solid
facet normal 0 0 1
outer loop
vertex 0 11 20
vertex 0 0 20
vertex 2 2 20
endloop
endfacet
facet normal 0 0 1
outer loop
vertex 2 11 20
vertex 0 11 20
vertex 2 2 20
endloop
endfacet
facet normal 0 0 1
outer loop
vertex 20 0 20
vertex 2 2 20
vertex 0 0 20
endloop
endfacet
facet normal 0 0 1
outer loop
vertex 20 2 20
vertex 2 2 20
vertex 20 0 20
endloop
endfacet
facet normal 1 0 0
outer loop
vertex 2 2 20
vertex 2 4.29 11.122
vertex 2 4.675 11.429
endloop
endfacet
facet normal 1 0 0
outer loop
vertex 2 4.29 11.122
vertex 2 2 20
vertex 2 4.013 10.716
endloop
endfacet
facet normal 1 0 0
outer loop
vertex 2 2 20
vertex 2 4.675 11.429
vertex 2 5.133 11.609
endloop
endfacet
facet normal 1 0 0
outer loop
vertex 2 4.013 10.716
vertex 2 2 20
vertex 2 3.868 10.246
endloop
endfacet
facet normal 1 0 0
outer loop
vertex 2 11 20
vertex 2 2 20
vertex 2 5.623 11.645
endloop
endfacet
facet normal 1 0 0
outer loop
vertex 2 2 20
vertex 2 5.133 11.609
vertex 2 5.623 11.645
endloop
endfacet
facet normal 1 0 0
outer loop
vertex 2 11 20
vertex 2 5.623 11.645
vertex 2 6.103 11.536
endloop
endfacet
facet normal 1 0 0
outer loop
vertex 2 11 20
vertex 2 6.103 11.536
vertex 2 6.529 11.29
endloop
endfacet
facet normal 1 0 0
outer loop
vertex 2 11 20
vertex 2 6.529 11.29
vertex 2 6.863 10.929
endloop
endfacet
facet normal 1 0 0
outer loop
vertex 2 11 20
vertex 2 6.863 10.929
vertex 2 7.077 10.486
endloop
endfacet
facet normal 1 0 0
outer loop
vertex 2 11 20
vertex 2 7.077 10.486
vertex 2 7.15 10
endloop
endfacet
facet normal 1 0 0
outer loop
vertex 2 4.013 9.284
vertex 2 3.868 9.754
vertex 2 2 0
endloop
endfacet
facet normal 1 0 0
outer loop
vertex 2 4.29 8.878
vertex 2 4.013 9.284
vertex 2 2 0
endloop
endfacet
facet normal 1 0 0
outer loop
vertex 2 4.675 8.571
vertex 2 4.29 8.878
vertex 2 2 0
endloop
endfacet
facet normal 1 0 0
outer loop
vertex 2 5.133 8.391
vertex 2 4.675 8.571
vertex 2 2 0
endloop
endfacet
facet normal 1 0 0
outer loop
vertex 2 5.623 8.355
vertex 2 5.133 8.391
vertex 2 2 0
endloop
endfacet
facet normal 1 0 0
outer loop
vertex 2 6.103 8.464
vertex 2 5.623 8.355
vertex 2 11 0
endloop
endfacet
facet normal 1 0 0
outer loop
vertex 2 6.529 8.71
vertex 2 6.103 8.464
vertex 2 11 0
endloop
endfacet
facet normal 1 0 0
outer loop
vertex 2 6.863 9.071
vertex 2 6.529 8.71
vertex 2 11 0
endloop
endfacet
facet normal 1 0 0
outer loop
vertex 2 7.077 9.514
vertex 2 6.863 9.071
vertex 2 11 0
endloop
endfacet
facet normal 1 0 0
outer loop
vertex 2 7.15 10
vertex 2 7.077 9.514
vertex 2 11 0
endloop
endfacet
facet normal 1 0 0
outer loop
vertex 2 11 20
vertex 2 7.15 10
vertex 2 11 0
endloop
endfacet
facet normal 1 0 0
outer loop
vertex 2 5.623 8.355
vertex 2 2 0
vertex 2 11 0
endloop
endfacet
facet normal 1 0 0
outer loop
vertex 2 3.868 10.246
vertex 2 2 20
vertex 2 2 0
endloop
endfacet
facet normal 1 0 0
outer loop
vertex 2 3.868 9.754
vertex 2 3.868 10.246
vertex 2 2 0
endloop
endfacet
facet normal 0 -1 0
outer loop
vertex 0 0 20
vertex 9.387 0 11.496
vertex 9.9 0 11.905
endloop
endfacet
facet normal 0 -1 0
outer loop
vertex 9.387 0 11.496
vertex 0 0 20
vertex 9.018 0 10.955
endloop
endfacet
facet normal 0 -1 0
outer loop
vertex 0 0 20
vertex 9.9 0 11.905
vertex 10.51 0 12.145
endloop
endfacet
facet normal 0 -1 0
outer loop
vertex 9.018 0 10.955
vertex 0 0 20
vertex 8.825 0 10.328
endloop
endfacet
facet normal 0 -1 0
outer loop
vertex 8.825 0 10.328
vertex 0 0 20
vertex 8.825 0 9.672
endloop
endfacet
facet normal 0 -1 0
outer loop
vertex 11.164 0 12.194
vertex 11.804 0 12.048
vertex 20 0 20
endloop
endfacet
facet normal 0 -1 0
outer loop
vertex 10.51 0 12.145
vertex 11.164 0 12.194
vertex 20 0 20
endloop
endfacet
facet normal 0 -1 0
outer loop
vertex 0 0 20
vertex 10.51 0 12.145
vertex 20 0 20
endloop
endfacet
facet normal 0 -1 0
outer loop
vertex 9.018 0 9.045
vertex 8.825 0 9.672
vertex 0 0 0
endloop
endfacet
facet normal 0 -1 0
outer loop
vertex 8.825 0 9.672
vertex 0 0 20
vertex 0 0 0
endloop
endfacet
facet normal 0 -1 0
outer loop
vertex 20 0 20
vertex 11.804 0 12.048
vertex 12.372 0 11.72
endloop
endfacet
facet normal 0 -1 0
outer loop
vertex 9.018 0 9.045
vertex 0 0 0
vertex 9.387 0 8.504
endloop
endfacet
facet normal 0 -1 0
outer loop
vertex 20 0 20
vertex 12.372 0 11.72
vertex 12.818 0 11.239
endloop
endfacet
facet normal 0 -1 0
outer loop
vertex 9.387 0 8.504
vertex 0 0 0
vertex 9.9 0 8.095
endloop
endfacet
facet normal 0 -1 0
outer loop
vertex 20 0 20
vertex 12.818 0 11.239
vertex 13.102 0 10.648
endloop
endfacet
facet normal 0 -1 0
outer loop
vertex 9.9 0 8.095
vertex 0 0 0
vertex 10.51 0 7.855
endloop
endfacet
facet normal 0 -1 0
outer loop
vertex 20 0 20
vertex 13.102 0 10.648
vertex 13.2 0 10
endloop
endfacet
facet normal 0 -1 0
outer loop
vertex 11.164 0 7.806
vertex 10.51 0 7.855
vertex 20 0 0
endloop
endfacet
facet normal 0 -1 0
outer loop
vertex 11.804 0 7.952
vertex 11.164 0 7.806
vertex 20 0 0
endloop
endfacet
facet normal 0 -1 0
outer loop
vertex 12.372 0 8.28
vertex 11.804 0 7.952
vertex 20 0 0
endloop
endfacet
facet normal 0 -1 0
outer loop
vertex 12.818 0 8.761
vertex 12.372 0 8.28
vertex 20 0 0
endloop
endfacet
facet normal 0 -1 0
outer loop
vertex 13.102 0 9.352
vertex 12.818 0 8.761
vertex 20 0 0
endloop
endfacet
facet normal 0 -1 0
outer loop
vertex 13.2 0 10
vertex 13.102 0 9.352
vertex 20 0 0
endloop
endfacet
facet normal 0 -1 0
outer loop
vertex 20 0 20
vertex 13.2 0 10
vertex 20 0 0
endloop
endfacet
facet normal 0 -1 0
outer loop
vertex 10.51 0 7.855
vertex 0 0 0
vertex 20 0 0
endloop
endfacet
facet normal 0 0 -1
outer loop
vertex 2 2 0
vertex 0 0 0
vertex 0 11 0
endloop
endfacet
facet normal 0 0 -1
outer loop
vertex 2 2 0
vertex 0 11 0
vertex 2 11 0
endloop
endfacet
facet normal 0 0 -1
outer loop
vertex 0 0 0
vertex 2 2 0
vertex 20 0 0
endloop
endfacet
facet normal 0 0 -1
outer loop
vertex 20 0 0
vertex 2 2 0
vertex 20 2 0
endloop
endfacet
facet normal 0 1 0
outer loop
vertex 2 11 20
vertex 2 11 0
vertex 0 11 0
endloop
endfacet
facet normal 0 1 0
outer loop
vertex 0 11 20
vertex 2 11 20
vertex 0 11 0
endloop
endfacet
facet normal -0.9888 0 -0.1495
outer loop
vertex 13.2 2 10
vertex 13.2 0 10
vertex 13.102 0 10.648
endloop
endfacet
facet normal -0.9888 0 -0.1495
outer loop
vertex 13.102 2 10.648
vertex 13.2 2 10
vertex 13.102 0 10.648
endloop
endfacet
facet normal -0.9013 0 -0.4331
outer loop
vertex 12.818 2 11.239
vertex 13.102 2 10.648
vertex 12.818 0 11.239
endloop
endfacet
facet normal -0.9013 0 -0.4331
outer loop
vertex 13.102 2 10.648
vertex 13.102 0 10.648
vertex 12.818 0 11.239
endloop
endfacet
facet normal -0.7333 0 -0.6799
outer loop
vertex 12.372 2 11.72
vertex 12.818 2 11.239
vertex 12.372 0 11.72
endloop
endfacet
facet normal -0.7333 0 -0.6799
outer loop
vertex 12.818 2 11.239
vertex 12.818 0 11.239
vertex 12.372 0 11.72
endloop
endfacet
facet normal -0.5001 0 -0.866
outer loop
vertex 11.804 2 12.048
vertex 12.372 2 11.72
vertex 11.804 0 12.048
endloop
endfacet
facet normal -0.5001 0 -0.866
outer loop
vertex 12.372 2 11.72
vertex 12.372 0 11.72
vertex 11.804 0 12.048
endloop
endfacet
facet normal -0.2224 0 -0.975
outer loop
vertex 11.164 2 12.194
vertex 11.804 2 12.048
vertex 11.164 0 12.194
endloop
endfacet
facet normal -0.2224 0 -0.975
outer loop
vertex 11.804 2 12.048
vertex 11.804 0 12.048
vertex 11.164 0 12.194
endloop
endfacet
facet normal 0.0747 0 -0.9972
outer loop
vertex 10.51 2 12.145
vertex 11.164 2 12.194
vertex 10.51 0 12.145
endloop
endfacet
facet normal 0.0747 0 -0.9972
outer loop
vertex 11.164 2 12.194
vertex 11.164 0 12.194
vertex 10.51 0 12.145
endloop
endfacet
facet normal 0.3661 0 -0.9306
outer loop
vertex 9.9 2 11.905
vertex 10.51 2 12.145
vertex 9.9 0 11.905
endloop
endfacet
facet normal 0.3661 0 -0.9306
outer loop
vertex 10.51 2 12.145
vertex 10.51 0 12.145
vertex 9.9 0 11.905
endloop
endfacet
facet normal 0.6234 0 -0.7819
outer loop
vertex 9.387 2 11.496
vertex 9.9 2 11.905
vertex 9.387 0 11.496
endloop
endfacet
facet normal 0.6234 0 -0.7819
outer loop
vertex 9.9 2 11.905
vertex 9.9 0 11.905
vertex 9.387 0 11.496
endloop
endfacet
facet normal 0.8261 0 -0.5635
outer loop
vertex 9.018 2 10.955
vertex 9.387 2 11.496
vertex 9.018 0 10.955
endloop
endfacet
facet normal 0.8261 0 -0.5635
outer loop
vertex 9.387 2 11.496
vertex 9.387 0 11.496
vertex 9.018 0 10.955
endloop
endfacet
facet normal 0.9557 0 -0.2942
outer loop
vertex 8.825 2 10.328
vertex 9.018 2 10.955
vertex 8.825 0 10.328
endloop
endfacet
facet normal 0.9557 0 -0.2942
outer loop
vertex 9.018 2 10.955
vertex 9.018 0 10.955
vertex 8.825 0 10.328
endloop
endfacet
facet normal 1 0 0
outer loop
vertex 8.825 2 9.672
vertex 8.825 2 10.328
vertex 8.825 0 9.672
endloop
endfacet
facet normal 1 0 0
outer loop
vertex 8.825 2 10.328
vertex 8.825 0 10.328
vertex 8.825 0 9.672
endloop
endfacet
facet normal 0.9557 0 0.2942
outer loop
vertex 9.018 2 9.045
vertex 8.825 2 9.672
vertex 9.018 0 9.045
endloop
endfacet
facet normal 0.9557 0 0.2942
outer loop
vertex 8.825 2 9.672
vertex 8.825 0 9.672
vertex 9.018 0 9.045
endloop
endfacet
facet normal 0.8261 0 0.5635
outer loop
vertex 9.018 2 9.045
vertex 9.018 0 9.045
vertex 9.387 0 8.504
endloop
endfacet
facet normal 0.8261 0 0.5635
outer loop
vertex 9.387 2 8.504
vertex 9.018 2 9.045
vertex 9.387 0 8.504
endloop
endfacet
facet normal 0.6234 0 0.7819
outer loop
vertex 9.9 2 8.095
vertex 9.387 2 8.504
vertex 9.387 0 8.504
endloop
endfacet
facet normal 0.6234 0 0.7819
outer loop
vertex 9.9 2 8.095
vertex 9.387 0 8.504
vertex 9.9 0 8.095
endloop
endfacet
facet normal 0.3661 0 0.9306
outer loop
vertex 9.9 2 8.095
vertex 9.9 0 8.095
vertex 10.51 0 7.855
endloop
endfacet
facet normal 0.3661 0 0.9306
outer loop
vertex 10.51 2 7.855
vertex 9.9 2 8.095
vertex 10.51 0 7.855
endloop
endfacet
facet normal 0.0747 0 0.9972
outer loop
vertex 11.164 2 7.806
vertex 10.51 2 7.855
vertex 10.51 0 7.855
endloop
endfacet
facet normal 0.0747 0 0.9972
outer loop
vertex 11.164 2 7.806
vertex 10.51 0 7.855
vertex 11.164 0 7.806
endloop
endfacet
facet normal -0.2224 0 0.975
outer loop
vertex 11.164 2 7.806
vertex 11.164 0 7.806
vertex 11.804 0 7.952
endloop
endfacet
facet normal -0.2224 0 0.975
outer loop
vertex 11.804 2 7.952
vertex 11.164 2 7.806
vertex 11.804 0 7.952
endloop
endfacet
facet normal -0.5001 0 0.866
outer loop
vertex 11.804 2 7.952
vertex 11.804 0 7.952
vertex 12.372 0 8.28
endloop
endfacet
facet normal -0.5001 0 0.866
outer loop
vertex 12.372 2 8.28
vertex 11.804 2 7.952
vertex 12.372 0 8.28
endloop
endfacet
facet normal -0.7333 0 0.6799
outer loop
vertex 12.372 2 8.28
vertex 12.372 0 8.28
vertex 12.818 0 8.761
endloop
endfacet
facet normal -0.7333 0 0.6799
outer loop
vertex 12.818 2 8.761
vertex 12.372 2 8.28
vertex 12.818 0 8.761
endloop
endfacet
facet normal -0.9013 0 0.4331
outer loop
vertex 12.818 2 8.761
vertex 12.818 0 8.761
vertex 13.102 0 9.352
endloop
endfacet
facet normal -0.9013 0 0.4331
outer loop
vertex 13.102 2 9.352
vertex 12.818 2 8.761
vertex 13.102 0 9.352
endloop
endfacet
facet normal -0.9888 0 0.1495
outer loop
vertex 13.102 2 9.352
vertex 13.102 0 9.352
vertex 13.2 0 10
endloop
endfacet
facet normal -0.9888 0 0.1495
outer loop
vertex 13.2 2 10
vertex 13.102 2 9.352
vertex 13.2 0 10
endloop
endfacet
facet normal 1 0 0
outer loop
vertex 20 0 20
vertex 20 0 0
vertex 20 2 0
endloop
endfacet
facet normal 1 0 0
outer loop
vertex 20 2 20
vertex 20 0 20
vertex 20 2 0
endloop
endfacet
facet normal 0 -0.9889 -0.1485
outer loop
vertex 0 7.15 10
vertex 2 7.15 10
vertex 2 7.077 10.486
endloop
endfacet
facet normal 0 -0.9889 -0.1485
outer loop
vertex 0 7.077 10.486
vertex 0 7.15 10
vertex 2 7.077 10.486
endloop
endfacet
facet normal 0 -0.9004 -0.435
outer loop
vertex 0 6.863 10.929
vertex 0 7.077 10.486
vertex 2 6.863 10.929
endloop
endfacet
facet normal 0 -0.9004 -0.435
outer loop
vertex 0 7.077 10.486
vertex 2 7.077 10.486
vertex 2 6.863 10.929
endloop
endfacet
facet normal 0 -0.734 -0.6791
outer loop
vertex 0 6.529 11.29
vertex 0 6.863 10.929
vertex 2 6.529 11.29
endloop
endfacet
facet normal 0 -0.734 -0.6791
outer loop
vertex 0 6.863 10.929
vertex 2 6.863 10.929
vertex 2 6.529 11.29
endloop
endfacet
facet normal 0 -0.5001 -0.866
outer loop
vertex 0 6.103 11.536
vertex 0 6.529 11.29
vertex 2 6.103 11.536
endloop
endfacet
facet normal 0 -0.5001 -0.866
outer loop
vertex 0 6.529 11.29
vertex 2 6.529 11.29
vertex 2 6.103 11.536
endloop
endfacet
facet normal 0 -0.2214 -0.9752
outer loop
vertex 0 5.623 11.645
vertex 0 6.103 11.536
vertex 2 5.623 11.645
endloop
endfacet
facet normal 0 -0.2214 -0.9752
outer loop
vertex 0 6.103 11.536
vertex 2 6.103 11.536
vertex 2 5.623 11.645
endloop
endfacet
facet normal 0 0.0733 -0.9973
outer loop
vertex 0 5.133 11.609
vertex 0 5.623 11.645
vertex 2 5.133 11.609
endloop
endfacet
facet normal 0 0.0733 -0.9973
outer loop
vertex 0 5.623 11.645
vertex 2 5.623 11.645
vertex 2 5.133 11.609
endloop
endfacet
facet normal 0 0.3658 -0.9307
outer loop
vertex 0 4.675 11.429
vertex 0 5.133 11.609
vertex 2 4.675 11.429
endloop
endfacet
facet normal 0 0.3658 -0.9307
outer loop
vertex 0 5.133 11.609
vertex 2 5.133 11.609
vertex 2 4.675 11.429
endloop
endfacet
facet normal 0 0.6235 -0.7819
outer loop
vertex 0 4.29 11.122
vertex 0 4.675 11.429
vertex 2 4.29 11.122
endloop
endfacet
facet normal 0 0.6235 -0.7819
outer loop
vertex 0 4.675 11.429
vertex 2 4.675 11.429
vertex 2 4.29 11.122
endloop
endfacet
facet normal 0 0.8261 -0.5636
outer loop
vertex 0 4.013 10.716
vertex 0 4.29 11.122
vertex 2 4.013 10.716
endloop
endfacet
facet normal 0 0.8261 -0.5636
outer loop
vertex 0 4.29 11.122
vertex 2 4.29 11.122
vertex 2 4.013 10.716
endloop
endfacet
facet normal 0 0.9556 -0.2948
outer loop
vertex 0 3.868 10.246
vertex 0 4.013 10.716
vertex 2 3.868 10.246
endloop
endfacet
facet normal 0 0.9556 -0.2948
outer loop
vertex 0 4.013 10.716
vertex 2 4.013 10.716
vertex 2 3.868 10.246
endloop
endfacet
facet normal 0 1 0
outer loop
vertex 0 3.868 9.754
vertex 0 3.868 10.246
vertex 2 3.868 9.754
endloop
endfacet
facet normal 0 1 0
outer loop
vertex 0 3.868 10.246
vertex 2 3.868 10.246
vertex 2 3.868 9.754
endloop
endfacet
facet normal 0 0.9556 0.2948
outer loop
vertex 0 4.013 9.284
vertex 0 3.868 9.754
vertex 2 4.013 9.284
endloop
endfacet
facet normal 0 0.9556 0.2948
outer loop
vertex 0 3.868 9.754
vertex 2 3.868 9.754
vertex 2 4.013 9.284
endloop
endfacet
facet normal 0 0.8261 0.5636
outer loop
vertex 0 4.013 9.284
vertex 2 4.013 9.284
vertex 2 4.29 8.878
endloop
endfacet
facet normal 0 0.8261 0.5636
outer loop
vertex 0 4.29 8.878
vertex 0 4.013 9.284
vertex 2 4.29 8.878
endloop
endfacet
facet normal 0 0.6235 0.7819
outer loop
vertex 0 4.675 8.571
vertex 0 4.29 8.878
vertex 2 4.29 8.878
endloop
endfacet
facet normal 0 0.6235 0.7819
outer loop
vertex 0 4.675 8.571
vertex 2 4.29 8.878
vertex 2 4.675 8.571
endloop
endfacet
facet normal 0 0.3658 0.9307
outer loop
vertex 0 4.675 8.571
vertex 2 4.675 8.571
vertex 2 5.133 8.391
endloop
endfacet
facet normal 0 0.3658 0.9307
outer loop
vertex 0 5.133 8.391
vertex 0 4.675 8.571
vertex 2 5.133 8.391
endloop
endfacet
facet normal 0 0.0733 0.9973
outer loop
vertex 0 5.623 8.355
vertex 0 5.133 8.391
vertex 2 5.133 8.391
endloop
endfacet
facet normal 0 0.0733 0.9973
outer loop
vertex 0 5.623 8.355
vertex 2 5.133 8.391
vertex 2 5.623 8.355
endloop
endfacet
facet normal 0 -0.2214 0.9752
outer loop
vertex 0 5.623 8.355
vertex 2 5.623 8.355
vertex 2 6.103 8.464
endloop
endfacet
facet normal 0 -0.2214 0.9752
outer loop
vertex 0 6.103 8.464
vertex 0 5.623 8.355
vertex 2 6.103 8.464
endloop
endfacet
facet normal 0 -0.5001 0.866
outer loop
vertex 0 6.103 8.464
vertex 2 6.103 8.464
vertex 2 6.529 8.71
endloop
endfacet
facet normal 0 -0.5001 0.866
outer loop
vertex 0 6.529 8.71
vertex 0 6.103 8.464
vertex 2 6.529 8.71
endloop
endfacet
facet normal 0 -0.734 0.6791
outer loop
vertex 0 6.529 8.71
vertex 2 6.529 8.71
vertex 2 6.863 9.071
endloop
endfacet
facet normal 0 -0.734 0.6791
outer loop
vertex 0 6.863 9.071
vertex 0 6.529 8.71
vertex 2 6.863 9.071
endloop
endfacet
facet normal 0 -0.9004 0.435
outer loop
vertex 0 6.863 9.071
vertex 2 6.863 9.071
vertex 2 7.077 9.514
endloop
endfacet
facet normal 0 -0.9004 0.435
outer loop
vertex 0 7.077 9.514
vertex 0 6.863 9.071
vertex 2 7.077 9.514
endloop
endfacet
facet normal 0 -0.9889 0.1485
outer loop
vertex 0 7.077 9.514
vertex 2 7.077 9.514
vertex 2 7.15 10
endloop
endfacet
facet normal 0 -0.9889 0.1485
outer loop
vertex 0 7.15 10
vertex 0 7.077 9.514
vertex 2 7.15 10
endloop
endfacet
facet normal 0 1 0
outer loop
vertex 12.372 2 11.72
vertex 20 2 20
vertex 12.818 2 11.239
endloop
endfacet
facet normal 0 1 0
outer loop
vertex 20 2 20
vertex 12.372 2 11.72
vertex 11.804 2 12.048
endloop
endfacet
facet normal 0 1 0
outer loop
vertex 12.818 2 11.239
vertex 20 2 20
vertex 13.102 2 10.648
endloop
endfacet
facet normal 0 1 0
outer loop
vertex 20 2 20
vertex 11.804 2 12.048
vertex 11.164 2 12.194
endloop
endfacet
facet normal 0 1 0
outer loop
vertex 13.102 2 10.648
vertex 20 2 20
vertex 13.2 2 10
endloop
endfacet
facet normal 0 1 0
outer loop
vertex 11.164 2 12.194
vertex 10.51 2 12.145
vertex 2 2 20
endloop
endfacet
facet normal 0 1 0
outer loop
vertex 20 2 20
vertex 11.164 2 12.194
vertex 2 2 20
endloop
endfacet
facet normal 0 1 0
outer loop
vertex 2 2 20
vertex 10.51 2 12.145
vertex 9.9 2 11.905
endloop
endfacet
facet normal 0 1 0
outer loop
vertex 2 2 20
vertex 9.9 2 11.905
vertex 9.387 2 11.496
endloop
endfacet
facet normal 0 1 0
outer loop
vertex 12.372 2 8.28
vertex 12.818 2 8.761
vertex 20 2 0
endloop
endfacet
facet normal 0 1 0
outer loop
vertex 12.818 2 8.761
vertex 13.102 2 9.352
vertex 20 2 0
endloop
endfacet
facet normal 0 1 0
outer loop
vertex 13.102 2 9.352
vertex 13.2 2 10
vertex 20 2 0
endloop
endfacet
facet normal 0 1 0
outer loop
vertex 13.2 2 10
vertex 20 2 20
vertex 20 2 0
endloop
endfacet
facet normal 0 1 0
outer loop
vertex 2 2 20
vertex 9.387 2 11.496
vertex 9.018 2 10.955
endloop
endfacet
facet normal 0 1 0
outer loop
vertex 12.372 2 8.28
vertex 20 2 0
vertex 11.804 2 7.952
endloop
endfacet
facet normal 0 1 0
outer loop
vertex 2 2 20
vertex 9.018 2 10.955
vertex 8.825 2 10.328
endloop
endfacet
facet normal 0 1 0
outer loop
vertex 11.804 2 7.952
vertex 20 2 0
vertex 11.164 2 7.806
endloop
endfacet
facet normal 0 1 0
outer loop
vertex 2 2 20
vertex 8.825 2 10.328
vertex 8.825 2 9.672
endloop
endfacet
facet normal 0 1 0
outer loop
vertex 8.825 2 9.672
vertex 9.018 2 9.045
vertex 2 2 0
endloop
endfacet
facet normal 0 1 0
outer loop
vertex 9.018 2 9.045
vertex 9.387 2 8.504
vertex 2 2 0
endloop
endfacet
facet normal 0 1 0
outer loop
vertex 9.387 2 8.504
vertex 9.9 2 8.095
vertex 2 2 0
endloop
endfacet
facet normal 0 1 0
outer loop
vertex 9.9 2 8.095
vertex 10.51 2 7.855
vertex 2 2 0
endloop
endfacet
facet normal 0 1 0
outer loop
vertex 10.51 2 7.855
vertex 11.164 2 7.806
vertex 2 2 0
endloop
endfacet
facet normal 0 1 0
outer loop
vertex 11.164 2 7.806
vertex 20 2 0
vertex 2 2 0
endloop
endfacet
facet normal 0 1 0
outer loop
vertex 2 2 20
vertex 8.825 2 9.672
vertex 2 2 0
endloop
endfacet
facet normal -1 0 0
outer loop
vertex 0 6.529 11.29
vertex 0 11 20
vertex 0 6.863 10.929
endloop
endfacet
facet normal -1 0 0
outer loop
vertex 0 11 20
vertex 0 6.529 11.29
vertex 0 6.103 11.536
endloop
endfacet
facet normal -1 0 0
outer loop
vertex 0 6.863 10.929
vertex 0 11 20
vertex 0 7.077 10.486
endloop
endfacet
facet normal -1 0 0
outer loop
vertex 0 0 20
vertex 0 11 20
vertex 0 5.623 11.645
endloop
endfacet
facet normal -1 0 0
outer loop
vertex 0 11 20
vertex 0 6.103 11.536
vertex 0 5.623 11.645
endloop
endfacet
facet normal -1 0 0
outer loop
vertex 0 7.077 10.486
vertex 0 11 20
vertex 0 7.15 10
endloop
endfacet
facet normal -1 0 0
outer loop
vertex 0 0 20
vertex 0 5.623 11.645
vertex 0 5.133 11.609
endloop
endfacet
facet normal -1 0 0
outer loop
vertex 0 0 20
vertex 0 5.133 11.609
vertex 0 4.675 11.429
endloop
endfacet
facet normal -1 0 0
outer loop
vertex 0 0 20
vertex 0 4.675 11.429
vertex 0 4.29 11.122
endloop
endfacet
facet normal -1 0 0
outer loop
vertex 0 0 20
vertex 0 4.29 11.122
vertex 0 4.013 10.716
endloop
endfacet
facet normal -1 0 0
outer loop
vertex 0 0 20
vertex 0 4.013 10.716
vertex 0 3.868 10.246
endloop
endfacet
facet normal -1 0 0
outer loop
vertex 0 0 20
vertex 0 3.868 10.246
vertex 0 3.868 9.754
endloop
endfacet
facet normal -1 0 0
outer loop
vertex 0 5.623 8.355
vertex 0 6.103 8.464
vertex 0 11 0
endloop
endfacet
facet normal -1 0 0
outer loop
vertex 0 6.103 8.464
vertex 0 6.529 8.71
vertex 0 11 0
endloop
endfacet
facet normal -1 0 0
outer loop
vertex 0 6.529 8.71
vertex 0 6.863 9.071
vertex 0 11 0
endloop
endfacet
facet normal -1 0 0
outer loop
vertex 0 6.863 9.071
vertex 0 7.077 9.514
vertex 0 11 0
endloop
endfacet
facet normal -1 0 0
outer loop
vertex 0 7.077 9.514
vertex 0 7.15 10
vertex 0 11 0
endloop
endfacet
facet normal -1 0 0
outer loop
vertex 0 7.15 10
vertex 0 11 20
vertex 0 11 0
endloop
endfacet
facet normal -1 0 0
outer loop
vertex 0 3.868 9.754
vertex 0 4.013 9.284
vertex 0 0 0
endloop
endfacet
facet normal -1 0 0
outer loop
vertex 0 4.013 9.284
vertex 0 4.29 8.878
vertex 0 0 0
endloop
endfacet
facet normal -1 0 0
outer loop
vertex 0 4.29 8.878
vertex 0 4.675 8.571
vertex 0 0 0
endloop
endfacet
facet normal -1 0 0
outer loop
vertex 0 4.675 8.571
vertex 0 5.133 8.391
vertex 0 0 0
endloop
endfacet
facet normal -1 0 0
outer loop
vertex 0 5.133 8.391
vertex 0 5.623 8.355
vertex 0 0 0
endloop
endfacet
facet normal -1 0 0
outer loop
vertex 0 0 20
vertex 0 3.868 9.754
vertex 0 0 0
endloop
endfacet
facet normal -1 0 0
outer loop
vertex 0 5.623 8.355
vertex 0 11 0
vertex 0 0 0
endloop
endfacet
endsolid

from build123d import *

# Parameters (mm, degrees)
F1_DEPTH = 20
F3_D     = 4.4
F5_D     = 3.3


with BuildPart() as f1:
    # F0 (on Top) → F1 (new body)
    with BuildSketch(Plane.XY):
        Polygon((0, 11), (0, 0), (20, 0), (20, 2), (2, 2), (2, 11), align=None)
    extrude(amount=F1_DEPTH)

    # F3 (through all)
    with Locations(Plane(origin=(0, 2, 0), x_dir=(-1, 0, 0), z_dir=(0, 1, 0))):
        with Locations((-11, 10)):
            Hole(F3_D / 2)

    # F5 (through all)
    with Locations(Plane(origin=(0, 0, 0), x_dir=(0, -1, 0), z_dir=(-1, 0, 0))):
        with Locations((-5.5, 10)):
            Hole(F5_D / 2)


solid = f1.part
